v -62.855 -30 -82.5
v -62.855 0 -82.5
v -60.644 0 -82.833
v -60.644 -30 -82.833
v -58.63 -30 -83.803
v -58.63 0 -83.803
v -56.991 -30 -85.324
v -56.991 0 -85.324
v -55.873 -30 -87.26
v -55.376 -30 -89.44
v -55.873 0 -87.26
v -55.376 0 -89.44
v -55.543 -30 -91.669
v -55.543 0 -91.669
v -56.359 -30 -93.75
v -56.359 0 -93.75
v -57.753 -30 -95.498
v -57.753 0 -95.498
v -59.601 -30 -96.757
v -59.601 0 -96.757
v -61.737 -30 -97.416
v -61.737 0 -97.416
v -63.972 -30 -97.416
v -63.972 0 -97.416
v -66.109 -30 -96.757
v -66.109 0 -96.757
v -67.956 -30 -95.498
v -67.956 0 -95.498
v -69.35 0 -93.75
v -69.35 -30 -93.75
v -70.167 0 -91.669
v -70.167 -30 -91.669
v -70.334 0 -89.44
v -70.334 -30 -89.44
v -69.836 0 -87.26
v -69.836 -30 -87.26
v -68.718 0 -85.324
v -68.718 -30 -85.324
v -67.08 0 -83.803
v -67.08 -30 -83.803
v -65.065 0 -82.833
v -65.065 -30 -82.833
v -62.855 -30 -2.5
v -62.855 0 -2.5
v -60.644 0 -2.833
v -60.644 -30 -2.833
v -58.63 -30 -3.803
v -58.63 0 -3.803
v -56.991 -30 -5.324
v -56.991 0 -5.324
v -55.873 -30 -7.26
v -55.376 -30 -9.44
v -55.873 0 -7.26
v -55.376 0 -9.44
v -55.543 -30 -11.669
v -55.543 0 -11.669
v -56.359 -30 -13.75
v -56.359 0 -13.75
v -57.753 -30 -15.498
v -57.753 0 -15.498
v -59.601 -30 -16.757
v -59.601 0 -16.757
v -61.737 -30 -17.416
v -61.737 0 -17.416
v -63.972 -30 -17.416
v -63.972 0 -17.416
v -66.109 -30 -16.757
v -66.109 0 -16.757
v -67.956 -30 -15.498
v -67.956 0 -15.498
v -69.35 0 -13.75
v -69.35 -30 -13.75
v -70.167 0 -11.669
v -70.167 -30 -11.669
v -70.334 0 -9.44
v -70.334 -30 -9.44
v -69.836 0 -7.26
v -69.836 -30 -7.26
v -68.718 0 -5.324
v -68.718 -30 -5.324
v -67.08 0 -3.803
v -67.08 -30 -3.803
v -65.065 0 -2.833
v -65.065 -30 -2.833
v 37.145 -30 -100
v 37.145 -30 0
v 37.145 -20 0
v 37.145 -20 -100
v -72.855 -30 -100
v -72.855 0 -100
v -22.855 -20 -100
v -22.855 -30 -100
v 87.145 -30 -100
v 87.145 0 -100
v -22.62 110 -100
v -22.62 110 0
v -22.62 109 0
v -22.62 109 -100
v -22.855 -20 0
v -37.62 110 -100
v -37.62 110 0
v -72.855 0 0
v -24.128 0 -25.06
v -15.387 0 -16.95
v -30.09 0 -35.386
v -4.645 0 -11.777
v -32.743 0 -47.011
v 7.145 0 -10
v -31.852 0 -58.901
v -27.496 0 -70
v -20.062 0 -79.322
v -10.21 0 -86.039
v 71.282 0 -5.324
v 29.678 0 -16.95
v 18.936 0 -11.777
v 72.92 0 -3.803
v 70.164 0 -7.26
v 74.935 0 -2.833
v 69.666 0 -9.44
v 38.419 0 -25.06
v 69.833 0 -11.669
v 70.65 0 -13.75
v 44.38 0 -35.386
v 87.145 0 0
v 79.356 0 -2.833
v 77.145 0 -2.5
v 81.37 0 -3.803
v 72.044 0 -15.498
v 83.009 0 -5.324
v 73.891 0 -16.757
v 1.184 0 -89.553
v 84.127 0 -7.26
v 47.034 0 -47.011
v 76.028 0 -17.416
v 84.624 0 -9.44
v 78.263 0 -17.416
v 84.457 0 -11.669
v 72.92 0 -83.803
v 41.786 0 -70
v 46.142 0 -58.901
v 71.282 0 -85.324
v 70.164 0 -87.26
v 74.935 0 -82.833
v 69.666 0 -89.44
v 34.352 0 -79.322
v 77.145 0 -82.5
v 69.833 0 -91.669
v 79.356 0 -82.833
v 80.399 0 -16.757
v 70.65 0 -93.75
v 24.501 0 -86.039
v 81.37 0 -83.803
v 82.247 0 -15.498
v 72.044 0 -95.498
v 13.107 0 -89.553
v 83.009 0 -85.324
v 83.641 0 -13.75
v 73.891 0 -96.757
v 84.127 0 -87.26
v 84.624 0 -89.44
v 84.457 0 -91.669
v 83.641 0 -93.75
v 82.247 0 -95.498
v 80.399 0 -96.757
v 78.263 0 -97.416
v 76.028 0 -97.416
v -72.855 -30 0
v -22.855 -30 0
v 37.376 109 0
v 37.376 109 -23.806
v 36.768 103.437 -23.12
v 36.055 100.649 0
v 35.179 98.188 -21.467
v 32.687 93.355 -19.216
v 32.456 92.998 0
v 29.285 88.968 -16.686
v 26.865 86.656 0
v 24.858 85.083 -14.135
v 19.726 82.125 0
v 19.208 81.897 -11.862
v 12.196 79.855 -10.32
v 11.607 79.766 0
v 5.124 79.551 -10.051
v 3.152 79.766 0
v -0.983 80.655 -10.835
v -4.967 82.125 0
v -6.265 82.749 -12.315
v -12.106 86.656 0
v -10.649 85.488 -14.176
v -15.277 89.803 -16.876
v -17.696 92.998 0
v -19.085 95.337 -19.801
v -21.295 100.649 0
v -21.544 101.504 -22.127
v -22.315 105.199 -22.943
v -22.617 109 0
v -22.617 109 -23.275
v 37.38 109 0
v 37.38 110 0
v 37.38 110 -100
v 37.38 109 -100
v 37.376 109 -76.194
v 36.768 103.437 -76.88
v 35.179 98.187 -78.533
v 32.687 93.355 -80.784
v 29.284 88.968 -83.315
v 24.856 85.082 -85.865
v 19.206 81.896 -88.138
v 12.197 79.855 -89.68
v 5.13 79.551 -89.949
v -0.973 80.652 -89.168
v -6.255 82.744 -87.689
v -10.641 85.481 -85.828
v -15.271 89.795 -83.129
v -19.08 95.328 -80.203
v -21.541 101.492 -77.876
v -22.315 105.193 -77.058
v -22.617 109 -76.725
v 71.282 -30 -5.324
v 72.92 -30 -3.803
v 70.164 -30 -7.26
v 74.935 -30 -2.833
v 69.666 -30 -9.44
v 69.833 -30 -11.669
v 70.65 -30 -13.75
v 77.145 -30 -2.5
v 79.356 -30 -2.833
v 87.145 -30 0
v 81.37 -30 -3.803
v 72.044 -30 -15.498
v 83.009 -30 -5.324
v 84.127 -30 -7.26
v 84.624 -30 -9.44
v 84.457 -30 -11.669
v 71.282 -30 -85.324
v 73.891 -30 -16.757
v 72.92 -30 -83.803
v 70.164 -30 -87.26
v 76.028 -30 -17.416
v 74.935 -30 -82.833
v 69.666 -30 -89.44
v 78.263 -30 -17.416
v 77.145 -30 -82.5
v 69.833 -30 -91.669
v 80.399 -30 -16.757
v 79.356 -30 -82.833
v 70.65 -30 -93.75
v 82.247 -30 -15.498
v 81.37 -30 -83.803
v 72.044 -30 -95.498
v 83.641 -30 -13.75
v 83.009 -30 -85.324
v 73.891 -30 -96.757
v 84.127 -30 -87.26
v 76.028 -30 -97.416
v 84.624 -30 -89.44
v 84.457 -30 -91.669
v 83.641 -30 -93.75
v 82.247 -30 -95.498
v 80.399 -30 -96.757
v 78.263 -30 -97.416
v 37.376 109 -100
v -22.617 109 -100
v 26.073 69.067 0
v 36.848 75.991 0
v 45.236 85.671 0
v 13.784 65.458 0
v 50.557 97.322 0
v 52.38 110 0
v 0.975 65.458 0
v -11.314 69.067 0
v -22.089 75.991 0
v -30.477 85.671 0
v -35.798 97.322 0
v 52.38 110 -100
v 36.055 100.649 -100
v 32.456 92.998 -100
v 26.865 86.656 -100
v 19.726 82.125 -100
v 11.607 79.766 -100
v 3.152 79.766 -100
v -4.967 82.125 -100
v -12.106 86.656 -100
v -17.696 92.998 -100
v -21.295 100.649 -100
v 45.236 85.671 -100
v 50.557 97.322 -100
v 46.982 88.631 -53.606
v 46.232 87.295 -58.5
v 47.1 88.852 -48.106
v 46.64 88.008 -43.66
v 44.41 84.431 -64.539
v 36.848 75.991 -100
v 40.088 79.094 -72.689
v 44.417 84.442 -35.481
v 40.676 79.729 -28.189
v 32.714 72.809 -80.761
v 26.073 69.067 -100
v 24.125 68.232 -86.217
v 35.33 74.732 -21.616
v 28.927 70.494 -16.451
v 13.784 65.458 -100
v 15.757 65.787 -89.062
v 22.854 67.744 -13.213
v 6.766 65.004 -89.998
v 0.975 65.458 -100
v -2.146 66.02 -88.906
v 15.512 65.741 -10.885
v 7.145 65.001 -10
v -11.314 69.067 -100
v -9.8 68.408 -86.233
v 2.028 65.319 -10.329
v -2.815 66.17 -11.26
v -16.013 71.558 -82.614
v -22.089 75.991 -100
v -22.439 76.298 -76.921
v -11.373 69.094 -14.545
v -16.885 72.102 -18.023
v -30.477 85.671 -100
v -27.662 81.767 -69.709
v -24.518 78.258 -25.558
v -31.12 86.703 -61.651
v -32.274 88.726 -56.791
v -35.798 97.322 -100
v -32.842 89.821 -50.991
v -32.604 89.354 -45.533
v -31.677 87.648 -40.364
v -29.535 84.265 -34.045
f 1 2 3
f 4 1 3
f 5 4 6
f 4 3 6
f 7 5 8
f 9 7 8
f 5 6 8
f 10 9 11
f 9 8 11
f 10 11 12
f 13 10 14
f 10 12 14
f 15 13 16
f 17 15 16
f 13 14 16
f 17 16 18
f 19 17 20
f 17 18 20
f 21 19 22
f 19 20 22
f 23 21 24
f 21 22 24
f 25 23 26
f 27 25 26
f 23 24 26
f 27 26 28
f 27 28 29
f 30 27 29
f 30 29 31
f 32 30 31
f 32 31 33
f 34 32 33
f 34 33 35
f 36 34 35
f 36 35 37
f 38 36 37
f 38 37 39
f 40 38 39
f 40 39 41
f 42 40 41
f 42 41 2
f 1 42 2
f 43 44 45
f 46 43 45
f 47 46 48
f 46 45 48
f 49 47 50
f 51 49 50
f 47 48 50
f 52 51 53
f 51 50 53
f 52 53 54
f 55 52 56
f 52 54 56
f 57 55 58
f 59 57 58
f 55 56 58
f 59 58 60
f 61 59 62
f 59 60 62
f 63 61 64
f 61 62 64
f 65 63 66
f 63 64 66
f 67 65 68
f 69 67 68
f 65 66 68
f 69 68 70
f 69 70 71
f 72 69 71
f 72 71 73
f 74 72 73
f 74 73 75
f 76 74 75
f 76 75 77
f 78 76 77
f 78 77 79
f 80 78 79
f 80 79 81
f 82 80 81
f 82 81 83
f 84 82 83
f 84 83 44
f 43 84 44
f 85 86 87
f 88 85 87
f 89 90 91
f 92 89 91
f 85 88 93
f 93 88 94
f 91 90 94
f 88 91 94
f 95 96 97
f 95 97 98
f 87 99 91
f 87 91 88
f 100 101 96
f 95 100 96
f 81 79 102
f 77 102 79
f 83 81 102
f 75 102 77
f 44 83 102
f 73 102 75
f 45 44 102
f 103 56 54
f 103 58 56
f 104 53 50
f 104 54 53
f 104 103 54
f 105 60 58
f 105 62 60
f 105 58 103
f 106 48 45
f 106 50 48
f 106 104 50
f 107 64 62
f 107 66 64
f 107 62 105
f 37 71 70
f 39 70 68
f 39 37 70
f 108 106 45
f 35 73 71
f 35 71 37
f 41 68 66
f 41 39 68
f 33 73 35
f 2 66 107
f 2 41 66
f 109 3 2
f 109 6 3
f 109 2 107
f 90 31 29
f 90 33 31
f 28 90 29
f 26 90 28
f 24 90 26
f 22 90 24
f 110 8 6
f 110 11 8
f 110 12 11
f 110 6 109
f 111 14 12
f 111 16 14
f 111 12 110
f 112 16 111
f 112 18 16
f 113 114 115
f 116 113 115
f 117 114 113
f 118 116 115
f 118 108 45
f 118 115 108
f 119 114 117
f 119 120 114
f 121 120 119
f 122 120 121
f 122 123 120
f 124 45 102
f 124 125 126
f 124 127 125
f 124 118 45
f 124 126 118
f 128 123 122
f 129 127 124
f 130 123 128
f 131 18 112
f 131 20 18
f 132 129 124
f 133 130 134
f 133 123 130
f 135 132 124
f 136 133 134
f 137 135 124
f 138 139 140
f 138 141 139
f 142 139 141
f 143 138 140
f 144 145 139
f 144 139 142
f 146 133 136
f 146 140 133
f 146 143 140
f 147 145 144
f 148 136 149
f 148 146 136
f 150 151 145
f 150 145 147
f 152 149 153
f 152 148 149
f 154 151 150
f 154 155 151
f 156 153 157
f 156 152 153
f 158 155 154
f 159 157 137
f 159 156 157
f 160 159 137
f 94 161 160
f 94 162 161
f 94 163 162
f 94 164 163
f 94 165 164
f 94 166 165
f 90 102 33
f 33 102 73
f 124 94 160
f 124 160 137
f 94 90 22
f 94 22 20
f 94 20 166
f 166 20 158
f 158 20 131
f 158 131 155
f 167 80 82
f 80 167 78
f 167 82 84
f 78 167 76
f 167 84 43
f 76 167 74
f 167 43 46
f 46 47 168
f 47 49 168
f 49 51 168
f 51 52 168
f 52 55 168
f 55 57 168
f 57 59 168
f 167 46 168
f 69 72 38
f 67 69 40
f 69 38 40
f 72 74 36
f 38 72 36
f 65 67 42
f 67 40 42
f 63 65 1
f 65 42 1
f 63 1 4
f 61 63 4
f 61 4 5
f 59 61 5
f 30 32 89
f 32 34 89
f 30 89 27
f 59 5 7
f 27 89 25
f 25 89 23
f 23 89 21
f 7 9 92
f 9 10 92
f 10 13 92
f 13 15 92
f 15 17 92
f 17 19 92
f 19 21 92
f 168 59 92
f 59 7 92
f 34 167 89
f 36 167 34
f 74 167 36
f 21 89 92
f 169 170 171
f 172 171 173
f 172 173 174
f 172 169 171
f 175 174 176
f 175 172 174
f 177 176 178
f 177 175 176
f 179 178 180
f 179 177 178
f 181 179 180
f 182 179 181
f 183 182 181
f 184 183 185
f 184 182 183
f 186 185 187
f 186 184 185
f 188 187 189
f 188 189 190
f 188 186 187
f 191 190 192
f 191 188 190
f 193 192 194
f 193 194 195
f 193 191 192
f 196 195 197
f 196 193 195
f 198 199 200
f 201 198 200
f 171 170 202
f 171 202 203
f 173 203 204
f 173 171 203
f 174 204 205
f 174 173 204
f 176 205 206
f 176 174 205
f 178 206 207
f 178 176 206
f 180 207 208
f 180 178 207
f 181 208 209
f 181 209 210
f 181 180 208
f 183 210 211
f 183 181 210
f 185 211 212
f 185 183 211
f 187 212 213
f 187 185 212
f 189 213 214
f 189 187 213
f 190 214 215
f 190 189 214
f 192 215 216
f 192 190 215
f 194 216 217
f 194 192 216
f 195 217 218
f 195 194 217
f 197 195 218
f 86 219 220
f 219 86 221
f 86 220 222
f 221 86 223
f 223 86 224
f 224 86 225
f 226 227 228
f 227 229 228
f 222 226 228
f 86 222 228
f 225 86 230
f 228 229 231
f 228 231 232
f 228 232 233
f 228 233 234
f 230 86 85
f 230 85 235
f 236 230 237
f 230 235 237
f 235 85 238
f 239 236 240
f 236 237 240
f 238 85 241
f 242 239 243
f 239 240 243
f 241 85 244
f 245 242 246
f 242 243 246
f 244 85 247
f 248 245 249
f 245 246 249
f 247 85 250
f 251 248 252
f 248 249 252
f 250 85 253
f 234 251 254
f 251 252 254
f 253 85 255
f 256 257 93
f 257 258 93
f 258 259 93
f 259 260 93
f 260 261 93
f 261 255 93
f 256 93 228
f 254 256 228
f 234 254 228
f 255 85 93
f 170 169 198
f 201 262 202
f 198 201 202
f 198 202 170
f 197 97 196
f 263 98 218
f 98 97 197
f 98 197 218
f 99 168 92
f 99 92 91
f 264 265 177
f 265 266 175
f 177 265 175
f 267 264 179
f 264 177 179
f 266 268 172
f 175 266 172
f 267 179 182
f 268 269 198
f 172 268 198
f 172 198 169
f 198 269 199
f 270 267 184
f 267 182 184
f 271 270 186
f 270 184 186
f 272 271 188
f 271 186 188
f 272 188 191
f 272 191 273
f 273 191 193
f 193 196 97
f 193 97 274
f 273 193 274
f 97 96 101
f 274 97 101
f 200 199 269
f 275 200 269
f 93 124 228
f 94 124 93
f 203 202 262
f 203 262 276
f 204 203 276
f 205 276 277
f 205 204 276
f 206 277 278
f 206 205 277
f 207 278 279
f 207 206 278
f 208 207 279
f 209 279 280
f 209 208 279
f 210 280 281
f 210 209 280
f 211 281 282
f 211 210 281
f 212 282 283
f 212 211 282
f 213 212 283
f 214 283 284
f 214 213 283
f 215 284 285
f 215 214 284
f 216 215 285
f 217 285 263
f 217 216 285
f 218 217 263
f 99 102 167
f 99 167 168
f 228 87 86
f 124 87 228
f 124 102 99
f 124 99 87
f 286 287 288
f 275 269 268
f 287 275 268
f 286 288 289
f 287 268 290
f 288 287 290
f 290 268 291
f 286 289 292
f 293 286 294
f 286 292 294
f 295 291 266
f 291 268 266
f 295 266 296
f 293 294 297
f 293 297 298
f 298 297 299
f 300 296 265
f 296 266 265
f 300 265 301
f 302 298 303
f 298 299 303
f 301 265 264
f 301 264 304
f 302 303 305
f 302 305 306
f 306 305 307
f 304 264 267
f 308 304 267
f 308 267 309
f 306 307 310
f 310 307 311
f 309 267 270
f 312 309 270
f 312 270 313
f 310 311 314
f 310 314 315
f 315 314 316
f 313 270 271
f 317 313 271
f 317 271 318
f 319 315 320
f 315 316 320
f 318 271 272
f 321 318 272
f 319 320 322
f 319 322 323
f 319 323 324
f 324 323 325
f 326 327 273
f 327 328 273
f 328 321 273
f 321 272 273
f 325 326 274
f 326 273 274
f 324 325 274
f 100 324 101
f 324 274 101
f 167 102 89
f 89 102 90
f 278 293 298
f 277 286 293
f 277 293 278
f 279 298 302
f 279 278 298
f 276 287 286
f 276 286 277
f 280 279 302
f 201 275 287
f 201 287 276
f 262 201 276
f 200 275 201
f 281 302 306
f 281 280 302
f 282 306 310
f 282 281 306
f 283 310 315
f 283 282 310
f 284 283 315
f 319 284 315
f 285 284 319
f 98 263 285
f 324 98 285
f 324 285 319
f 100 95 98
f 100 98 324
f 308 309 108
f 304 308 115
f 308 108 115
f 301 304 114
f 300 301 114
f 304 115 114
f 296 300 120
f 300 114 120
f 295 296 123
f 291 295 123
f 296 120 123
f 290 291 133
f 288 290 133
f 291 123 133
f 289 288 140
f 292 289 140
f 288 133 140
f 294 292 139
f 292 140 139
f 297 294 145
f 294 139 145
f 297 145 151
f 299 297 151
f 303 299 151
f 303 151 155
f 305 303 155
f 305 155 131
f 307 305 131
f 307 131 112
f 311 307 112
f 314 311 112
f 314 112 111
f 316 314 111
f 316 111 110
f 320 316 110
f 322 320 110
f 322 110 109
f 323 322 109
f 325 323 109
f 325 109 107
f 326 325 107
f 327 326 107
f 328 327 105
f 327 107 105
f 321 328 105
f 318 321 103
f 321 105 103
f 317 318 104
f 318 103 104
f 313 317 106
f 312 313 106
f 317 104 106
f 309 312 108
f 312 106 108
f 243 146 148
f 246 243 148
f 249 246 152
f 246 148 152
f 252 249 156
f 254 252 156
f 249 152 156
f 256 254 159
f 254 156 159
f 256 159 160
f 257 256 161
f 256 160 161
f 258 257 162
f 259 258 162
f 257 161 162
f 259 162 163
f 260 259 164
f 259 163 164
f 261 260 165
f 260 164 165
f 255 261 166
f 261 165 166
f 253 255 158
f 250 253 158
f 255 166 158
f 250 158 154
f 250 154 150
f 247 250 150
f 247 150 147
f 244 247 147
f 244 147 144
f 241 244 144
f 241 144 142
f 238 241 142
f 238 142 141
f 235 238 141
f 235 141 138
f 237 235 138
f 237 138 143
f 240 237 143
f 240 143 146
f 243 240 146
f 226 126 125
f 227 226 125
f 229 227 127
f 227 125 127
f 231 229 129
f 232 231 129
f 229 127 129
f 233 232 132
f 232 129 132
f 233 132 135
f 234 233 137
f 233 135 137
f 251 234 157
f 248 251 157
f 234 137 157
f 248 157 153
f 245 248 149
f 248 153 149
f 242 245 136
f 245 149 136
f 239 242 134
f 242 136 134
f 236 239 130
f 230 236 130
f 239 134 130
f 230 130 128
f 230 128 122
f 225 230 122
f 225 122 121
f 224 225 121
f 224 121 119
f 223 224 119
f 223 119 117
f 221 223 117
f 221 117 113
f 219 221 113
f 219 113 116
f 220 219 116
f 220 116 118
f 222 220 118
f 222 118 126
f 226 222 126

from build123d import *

# Parameters (mm, degrees)
SKETCH1_W           = 160
SKETCH1_H           = 100
BOSS_EXTRUDE1_DEPTH = 30
SKETCH2_R           = 40
BOSS_EXTRUDE2_DEPTH = 110
BOSS_EXTRUDE3_DEPTH = 100
CUT_EXTRUDE1_DEPTH  = 100
SKETCH6_W           = 60
SKETCH6_H           = 100
CUT_EXTRUDE2_DEPTH  = 1
SKETCH7_W           = 60
SKETCH7_H           = 10
CUT_EXTRUDE3_DEPTH  = 100
SKETCH8_R           = 7.5
CUT_EXTRUDE4_DEPTH  = 100


with BuildPart() as part:
    # Sketch1 → Boss-Extrude1 (new body)
    with BuildSketch(Plane(origin=(0, 0, 0), x_dir=(1, 0, 0), z_dir=(0, 1, 0))):
        with Locations((7.145359019, 50)):
            Rectangle(SKETCH1_W, SKETCH1_H)
    extrude(amount=-BOSS_EXTRUDE1_DEPTH)

    # Sketch2 → Boss-Extrude2 (add)
    with BuildSketch(Plane(origin=(0, 0, 0), x_dir=(1, 0, 0), z_dir=(0, 1, 0))):
        with Locations(Location((7.145359019, 50, 0), (0, 0, 270))):
            Circle(SKETCH2_R)
    extrude(amount=BOSS_EXTRUDE2_DEPTH)

    # Sketch3 → Boss-Extrude3 (add)
    with BuildSketch(Plane.XY):
        with BuildLine():
            Line((-37.620353567, 110), (52.379646433, 110))
            ThreePointArc((52.379646433, 110), (7.379646433, 65), (-37.620353567, 110))
        make_face()
        with BuildLine():
            Line((-22.620353567, 109.466218226), (37.379646433, 109.466218226))
            ThreePointArc((37.379646433, 109.466218226), (7.379646433, 79.466218226), (-22.620353567, 109.466218226))
        make_face(mode=Mode.SUBTRACT)
    extrude(amount=-BOSS_EXTRUDE3_DEPTH)

    # Sketch4 → Cut-Extrude1 (cut)
    with BuildSketch(Plane.XY):
        with BuildLine():
            Line((-22.620353567, 109.466218226), (37.379646433, 109.466218226))
            ThreePointArc((37.379646433, 109.466218226), (7.379646433, 79.466218226), (-22.620353567, 109.466218226))
        make_face()
    extrude(amount=-CUT_EXTRUDE1_DEPTH, mode=Mode.SUBTRACT)

    # Sketch6 → Cut-Extrude2 (cut)
    with BuildSketch(Plane(origin=(0, 110, 0), x_dir=(1, 0, 0), z_dir=(0, 1, 0))):
        with Locations((7.379646433, 50)):
            Rectangle(SKETCH6_W, SKETCH6_H)
    extrude(amount=-CUT_EXTRUDE2_DEPTH, mode=Mode.SUBTRACT)

    # Sketch7 → Cut-Extrude3 (cut)
    with BuildSketch(Plane.XY):
        with Locations((7.145359019, -25)):
            Rectangle(SKETCH7_W, SKETCH7_H)
    extrude(amount=-CUT_EXTRUDE3_DEPTH, mode=Mode.SUBTRACT)

    # Sketch8 → Cut-Extrude4 (cut)
    with BuildSketch(Plane(origin=(0, 0, 0), x_dir=(1, 0, 0), z_dir=(0, 1, 0))):
        with Locations(Location((77.145359019, 90, 0), (0, 0, 270))):
            Circle(SKETCH8_R)
        with Locations(Location((-62.854640981, 90, 0), (0, 0, 270))):
            Circle(SKETCH8_R)
        with Locations(Location((-62.854640981, 10, 0), (0, 0, 270))):
            Circle(SKETCH8_R)
        with Locations(Location((77.145359019, 10, 0), (0, 0, 270))):
            Circle(SKETCH8_R)
    extrude(amount=-CUT_EXTRUDE4_DEPTH, mode=Mode.SUBTRACT)


solid = part.part
